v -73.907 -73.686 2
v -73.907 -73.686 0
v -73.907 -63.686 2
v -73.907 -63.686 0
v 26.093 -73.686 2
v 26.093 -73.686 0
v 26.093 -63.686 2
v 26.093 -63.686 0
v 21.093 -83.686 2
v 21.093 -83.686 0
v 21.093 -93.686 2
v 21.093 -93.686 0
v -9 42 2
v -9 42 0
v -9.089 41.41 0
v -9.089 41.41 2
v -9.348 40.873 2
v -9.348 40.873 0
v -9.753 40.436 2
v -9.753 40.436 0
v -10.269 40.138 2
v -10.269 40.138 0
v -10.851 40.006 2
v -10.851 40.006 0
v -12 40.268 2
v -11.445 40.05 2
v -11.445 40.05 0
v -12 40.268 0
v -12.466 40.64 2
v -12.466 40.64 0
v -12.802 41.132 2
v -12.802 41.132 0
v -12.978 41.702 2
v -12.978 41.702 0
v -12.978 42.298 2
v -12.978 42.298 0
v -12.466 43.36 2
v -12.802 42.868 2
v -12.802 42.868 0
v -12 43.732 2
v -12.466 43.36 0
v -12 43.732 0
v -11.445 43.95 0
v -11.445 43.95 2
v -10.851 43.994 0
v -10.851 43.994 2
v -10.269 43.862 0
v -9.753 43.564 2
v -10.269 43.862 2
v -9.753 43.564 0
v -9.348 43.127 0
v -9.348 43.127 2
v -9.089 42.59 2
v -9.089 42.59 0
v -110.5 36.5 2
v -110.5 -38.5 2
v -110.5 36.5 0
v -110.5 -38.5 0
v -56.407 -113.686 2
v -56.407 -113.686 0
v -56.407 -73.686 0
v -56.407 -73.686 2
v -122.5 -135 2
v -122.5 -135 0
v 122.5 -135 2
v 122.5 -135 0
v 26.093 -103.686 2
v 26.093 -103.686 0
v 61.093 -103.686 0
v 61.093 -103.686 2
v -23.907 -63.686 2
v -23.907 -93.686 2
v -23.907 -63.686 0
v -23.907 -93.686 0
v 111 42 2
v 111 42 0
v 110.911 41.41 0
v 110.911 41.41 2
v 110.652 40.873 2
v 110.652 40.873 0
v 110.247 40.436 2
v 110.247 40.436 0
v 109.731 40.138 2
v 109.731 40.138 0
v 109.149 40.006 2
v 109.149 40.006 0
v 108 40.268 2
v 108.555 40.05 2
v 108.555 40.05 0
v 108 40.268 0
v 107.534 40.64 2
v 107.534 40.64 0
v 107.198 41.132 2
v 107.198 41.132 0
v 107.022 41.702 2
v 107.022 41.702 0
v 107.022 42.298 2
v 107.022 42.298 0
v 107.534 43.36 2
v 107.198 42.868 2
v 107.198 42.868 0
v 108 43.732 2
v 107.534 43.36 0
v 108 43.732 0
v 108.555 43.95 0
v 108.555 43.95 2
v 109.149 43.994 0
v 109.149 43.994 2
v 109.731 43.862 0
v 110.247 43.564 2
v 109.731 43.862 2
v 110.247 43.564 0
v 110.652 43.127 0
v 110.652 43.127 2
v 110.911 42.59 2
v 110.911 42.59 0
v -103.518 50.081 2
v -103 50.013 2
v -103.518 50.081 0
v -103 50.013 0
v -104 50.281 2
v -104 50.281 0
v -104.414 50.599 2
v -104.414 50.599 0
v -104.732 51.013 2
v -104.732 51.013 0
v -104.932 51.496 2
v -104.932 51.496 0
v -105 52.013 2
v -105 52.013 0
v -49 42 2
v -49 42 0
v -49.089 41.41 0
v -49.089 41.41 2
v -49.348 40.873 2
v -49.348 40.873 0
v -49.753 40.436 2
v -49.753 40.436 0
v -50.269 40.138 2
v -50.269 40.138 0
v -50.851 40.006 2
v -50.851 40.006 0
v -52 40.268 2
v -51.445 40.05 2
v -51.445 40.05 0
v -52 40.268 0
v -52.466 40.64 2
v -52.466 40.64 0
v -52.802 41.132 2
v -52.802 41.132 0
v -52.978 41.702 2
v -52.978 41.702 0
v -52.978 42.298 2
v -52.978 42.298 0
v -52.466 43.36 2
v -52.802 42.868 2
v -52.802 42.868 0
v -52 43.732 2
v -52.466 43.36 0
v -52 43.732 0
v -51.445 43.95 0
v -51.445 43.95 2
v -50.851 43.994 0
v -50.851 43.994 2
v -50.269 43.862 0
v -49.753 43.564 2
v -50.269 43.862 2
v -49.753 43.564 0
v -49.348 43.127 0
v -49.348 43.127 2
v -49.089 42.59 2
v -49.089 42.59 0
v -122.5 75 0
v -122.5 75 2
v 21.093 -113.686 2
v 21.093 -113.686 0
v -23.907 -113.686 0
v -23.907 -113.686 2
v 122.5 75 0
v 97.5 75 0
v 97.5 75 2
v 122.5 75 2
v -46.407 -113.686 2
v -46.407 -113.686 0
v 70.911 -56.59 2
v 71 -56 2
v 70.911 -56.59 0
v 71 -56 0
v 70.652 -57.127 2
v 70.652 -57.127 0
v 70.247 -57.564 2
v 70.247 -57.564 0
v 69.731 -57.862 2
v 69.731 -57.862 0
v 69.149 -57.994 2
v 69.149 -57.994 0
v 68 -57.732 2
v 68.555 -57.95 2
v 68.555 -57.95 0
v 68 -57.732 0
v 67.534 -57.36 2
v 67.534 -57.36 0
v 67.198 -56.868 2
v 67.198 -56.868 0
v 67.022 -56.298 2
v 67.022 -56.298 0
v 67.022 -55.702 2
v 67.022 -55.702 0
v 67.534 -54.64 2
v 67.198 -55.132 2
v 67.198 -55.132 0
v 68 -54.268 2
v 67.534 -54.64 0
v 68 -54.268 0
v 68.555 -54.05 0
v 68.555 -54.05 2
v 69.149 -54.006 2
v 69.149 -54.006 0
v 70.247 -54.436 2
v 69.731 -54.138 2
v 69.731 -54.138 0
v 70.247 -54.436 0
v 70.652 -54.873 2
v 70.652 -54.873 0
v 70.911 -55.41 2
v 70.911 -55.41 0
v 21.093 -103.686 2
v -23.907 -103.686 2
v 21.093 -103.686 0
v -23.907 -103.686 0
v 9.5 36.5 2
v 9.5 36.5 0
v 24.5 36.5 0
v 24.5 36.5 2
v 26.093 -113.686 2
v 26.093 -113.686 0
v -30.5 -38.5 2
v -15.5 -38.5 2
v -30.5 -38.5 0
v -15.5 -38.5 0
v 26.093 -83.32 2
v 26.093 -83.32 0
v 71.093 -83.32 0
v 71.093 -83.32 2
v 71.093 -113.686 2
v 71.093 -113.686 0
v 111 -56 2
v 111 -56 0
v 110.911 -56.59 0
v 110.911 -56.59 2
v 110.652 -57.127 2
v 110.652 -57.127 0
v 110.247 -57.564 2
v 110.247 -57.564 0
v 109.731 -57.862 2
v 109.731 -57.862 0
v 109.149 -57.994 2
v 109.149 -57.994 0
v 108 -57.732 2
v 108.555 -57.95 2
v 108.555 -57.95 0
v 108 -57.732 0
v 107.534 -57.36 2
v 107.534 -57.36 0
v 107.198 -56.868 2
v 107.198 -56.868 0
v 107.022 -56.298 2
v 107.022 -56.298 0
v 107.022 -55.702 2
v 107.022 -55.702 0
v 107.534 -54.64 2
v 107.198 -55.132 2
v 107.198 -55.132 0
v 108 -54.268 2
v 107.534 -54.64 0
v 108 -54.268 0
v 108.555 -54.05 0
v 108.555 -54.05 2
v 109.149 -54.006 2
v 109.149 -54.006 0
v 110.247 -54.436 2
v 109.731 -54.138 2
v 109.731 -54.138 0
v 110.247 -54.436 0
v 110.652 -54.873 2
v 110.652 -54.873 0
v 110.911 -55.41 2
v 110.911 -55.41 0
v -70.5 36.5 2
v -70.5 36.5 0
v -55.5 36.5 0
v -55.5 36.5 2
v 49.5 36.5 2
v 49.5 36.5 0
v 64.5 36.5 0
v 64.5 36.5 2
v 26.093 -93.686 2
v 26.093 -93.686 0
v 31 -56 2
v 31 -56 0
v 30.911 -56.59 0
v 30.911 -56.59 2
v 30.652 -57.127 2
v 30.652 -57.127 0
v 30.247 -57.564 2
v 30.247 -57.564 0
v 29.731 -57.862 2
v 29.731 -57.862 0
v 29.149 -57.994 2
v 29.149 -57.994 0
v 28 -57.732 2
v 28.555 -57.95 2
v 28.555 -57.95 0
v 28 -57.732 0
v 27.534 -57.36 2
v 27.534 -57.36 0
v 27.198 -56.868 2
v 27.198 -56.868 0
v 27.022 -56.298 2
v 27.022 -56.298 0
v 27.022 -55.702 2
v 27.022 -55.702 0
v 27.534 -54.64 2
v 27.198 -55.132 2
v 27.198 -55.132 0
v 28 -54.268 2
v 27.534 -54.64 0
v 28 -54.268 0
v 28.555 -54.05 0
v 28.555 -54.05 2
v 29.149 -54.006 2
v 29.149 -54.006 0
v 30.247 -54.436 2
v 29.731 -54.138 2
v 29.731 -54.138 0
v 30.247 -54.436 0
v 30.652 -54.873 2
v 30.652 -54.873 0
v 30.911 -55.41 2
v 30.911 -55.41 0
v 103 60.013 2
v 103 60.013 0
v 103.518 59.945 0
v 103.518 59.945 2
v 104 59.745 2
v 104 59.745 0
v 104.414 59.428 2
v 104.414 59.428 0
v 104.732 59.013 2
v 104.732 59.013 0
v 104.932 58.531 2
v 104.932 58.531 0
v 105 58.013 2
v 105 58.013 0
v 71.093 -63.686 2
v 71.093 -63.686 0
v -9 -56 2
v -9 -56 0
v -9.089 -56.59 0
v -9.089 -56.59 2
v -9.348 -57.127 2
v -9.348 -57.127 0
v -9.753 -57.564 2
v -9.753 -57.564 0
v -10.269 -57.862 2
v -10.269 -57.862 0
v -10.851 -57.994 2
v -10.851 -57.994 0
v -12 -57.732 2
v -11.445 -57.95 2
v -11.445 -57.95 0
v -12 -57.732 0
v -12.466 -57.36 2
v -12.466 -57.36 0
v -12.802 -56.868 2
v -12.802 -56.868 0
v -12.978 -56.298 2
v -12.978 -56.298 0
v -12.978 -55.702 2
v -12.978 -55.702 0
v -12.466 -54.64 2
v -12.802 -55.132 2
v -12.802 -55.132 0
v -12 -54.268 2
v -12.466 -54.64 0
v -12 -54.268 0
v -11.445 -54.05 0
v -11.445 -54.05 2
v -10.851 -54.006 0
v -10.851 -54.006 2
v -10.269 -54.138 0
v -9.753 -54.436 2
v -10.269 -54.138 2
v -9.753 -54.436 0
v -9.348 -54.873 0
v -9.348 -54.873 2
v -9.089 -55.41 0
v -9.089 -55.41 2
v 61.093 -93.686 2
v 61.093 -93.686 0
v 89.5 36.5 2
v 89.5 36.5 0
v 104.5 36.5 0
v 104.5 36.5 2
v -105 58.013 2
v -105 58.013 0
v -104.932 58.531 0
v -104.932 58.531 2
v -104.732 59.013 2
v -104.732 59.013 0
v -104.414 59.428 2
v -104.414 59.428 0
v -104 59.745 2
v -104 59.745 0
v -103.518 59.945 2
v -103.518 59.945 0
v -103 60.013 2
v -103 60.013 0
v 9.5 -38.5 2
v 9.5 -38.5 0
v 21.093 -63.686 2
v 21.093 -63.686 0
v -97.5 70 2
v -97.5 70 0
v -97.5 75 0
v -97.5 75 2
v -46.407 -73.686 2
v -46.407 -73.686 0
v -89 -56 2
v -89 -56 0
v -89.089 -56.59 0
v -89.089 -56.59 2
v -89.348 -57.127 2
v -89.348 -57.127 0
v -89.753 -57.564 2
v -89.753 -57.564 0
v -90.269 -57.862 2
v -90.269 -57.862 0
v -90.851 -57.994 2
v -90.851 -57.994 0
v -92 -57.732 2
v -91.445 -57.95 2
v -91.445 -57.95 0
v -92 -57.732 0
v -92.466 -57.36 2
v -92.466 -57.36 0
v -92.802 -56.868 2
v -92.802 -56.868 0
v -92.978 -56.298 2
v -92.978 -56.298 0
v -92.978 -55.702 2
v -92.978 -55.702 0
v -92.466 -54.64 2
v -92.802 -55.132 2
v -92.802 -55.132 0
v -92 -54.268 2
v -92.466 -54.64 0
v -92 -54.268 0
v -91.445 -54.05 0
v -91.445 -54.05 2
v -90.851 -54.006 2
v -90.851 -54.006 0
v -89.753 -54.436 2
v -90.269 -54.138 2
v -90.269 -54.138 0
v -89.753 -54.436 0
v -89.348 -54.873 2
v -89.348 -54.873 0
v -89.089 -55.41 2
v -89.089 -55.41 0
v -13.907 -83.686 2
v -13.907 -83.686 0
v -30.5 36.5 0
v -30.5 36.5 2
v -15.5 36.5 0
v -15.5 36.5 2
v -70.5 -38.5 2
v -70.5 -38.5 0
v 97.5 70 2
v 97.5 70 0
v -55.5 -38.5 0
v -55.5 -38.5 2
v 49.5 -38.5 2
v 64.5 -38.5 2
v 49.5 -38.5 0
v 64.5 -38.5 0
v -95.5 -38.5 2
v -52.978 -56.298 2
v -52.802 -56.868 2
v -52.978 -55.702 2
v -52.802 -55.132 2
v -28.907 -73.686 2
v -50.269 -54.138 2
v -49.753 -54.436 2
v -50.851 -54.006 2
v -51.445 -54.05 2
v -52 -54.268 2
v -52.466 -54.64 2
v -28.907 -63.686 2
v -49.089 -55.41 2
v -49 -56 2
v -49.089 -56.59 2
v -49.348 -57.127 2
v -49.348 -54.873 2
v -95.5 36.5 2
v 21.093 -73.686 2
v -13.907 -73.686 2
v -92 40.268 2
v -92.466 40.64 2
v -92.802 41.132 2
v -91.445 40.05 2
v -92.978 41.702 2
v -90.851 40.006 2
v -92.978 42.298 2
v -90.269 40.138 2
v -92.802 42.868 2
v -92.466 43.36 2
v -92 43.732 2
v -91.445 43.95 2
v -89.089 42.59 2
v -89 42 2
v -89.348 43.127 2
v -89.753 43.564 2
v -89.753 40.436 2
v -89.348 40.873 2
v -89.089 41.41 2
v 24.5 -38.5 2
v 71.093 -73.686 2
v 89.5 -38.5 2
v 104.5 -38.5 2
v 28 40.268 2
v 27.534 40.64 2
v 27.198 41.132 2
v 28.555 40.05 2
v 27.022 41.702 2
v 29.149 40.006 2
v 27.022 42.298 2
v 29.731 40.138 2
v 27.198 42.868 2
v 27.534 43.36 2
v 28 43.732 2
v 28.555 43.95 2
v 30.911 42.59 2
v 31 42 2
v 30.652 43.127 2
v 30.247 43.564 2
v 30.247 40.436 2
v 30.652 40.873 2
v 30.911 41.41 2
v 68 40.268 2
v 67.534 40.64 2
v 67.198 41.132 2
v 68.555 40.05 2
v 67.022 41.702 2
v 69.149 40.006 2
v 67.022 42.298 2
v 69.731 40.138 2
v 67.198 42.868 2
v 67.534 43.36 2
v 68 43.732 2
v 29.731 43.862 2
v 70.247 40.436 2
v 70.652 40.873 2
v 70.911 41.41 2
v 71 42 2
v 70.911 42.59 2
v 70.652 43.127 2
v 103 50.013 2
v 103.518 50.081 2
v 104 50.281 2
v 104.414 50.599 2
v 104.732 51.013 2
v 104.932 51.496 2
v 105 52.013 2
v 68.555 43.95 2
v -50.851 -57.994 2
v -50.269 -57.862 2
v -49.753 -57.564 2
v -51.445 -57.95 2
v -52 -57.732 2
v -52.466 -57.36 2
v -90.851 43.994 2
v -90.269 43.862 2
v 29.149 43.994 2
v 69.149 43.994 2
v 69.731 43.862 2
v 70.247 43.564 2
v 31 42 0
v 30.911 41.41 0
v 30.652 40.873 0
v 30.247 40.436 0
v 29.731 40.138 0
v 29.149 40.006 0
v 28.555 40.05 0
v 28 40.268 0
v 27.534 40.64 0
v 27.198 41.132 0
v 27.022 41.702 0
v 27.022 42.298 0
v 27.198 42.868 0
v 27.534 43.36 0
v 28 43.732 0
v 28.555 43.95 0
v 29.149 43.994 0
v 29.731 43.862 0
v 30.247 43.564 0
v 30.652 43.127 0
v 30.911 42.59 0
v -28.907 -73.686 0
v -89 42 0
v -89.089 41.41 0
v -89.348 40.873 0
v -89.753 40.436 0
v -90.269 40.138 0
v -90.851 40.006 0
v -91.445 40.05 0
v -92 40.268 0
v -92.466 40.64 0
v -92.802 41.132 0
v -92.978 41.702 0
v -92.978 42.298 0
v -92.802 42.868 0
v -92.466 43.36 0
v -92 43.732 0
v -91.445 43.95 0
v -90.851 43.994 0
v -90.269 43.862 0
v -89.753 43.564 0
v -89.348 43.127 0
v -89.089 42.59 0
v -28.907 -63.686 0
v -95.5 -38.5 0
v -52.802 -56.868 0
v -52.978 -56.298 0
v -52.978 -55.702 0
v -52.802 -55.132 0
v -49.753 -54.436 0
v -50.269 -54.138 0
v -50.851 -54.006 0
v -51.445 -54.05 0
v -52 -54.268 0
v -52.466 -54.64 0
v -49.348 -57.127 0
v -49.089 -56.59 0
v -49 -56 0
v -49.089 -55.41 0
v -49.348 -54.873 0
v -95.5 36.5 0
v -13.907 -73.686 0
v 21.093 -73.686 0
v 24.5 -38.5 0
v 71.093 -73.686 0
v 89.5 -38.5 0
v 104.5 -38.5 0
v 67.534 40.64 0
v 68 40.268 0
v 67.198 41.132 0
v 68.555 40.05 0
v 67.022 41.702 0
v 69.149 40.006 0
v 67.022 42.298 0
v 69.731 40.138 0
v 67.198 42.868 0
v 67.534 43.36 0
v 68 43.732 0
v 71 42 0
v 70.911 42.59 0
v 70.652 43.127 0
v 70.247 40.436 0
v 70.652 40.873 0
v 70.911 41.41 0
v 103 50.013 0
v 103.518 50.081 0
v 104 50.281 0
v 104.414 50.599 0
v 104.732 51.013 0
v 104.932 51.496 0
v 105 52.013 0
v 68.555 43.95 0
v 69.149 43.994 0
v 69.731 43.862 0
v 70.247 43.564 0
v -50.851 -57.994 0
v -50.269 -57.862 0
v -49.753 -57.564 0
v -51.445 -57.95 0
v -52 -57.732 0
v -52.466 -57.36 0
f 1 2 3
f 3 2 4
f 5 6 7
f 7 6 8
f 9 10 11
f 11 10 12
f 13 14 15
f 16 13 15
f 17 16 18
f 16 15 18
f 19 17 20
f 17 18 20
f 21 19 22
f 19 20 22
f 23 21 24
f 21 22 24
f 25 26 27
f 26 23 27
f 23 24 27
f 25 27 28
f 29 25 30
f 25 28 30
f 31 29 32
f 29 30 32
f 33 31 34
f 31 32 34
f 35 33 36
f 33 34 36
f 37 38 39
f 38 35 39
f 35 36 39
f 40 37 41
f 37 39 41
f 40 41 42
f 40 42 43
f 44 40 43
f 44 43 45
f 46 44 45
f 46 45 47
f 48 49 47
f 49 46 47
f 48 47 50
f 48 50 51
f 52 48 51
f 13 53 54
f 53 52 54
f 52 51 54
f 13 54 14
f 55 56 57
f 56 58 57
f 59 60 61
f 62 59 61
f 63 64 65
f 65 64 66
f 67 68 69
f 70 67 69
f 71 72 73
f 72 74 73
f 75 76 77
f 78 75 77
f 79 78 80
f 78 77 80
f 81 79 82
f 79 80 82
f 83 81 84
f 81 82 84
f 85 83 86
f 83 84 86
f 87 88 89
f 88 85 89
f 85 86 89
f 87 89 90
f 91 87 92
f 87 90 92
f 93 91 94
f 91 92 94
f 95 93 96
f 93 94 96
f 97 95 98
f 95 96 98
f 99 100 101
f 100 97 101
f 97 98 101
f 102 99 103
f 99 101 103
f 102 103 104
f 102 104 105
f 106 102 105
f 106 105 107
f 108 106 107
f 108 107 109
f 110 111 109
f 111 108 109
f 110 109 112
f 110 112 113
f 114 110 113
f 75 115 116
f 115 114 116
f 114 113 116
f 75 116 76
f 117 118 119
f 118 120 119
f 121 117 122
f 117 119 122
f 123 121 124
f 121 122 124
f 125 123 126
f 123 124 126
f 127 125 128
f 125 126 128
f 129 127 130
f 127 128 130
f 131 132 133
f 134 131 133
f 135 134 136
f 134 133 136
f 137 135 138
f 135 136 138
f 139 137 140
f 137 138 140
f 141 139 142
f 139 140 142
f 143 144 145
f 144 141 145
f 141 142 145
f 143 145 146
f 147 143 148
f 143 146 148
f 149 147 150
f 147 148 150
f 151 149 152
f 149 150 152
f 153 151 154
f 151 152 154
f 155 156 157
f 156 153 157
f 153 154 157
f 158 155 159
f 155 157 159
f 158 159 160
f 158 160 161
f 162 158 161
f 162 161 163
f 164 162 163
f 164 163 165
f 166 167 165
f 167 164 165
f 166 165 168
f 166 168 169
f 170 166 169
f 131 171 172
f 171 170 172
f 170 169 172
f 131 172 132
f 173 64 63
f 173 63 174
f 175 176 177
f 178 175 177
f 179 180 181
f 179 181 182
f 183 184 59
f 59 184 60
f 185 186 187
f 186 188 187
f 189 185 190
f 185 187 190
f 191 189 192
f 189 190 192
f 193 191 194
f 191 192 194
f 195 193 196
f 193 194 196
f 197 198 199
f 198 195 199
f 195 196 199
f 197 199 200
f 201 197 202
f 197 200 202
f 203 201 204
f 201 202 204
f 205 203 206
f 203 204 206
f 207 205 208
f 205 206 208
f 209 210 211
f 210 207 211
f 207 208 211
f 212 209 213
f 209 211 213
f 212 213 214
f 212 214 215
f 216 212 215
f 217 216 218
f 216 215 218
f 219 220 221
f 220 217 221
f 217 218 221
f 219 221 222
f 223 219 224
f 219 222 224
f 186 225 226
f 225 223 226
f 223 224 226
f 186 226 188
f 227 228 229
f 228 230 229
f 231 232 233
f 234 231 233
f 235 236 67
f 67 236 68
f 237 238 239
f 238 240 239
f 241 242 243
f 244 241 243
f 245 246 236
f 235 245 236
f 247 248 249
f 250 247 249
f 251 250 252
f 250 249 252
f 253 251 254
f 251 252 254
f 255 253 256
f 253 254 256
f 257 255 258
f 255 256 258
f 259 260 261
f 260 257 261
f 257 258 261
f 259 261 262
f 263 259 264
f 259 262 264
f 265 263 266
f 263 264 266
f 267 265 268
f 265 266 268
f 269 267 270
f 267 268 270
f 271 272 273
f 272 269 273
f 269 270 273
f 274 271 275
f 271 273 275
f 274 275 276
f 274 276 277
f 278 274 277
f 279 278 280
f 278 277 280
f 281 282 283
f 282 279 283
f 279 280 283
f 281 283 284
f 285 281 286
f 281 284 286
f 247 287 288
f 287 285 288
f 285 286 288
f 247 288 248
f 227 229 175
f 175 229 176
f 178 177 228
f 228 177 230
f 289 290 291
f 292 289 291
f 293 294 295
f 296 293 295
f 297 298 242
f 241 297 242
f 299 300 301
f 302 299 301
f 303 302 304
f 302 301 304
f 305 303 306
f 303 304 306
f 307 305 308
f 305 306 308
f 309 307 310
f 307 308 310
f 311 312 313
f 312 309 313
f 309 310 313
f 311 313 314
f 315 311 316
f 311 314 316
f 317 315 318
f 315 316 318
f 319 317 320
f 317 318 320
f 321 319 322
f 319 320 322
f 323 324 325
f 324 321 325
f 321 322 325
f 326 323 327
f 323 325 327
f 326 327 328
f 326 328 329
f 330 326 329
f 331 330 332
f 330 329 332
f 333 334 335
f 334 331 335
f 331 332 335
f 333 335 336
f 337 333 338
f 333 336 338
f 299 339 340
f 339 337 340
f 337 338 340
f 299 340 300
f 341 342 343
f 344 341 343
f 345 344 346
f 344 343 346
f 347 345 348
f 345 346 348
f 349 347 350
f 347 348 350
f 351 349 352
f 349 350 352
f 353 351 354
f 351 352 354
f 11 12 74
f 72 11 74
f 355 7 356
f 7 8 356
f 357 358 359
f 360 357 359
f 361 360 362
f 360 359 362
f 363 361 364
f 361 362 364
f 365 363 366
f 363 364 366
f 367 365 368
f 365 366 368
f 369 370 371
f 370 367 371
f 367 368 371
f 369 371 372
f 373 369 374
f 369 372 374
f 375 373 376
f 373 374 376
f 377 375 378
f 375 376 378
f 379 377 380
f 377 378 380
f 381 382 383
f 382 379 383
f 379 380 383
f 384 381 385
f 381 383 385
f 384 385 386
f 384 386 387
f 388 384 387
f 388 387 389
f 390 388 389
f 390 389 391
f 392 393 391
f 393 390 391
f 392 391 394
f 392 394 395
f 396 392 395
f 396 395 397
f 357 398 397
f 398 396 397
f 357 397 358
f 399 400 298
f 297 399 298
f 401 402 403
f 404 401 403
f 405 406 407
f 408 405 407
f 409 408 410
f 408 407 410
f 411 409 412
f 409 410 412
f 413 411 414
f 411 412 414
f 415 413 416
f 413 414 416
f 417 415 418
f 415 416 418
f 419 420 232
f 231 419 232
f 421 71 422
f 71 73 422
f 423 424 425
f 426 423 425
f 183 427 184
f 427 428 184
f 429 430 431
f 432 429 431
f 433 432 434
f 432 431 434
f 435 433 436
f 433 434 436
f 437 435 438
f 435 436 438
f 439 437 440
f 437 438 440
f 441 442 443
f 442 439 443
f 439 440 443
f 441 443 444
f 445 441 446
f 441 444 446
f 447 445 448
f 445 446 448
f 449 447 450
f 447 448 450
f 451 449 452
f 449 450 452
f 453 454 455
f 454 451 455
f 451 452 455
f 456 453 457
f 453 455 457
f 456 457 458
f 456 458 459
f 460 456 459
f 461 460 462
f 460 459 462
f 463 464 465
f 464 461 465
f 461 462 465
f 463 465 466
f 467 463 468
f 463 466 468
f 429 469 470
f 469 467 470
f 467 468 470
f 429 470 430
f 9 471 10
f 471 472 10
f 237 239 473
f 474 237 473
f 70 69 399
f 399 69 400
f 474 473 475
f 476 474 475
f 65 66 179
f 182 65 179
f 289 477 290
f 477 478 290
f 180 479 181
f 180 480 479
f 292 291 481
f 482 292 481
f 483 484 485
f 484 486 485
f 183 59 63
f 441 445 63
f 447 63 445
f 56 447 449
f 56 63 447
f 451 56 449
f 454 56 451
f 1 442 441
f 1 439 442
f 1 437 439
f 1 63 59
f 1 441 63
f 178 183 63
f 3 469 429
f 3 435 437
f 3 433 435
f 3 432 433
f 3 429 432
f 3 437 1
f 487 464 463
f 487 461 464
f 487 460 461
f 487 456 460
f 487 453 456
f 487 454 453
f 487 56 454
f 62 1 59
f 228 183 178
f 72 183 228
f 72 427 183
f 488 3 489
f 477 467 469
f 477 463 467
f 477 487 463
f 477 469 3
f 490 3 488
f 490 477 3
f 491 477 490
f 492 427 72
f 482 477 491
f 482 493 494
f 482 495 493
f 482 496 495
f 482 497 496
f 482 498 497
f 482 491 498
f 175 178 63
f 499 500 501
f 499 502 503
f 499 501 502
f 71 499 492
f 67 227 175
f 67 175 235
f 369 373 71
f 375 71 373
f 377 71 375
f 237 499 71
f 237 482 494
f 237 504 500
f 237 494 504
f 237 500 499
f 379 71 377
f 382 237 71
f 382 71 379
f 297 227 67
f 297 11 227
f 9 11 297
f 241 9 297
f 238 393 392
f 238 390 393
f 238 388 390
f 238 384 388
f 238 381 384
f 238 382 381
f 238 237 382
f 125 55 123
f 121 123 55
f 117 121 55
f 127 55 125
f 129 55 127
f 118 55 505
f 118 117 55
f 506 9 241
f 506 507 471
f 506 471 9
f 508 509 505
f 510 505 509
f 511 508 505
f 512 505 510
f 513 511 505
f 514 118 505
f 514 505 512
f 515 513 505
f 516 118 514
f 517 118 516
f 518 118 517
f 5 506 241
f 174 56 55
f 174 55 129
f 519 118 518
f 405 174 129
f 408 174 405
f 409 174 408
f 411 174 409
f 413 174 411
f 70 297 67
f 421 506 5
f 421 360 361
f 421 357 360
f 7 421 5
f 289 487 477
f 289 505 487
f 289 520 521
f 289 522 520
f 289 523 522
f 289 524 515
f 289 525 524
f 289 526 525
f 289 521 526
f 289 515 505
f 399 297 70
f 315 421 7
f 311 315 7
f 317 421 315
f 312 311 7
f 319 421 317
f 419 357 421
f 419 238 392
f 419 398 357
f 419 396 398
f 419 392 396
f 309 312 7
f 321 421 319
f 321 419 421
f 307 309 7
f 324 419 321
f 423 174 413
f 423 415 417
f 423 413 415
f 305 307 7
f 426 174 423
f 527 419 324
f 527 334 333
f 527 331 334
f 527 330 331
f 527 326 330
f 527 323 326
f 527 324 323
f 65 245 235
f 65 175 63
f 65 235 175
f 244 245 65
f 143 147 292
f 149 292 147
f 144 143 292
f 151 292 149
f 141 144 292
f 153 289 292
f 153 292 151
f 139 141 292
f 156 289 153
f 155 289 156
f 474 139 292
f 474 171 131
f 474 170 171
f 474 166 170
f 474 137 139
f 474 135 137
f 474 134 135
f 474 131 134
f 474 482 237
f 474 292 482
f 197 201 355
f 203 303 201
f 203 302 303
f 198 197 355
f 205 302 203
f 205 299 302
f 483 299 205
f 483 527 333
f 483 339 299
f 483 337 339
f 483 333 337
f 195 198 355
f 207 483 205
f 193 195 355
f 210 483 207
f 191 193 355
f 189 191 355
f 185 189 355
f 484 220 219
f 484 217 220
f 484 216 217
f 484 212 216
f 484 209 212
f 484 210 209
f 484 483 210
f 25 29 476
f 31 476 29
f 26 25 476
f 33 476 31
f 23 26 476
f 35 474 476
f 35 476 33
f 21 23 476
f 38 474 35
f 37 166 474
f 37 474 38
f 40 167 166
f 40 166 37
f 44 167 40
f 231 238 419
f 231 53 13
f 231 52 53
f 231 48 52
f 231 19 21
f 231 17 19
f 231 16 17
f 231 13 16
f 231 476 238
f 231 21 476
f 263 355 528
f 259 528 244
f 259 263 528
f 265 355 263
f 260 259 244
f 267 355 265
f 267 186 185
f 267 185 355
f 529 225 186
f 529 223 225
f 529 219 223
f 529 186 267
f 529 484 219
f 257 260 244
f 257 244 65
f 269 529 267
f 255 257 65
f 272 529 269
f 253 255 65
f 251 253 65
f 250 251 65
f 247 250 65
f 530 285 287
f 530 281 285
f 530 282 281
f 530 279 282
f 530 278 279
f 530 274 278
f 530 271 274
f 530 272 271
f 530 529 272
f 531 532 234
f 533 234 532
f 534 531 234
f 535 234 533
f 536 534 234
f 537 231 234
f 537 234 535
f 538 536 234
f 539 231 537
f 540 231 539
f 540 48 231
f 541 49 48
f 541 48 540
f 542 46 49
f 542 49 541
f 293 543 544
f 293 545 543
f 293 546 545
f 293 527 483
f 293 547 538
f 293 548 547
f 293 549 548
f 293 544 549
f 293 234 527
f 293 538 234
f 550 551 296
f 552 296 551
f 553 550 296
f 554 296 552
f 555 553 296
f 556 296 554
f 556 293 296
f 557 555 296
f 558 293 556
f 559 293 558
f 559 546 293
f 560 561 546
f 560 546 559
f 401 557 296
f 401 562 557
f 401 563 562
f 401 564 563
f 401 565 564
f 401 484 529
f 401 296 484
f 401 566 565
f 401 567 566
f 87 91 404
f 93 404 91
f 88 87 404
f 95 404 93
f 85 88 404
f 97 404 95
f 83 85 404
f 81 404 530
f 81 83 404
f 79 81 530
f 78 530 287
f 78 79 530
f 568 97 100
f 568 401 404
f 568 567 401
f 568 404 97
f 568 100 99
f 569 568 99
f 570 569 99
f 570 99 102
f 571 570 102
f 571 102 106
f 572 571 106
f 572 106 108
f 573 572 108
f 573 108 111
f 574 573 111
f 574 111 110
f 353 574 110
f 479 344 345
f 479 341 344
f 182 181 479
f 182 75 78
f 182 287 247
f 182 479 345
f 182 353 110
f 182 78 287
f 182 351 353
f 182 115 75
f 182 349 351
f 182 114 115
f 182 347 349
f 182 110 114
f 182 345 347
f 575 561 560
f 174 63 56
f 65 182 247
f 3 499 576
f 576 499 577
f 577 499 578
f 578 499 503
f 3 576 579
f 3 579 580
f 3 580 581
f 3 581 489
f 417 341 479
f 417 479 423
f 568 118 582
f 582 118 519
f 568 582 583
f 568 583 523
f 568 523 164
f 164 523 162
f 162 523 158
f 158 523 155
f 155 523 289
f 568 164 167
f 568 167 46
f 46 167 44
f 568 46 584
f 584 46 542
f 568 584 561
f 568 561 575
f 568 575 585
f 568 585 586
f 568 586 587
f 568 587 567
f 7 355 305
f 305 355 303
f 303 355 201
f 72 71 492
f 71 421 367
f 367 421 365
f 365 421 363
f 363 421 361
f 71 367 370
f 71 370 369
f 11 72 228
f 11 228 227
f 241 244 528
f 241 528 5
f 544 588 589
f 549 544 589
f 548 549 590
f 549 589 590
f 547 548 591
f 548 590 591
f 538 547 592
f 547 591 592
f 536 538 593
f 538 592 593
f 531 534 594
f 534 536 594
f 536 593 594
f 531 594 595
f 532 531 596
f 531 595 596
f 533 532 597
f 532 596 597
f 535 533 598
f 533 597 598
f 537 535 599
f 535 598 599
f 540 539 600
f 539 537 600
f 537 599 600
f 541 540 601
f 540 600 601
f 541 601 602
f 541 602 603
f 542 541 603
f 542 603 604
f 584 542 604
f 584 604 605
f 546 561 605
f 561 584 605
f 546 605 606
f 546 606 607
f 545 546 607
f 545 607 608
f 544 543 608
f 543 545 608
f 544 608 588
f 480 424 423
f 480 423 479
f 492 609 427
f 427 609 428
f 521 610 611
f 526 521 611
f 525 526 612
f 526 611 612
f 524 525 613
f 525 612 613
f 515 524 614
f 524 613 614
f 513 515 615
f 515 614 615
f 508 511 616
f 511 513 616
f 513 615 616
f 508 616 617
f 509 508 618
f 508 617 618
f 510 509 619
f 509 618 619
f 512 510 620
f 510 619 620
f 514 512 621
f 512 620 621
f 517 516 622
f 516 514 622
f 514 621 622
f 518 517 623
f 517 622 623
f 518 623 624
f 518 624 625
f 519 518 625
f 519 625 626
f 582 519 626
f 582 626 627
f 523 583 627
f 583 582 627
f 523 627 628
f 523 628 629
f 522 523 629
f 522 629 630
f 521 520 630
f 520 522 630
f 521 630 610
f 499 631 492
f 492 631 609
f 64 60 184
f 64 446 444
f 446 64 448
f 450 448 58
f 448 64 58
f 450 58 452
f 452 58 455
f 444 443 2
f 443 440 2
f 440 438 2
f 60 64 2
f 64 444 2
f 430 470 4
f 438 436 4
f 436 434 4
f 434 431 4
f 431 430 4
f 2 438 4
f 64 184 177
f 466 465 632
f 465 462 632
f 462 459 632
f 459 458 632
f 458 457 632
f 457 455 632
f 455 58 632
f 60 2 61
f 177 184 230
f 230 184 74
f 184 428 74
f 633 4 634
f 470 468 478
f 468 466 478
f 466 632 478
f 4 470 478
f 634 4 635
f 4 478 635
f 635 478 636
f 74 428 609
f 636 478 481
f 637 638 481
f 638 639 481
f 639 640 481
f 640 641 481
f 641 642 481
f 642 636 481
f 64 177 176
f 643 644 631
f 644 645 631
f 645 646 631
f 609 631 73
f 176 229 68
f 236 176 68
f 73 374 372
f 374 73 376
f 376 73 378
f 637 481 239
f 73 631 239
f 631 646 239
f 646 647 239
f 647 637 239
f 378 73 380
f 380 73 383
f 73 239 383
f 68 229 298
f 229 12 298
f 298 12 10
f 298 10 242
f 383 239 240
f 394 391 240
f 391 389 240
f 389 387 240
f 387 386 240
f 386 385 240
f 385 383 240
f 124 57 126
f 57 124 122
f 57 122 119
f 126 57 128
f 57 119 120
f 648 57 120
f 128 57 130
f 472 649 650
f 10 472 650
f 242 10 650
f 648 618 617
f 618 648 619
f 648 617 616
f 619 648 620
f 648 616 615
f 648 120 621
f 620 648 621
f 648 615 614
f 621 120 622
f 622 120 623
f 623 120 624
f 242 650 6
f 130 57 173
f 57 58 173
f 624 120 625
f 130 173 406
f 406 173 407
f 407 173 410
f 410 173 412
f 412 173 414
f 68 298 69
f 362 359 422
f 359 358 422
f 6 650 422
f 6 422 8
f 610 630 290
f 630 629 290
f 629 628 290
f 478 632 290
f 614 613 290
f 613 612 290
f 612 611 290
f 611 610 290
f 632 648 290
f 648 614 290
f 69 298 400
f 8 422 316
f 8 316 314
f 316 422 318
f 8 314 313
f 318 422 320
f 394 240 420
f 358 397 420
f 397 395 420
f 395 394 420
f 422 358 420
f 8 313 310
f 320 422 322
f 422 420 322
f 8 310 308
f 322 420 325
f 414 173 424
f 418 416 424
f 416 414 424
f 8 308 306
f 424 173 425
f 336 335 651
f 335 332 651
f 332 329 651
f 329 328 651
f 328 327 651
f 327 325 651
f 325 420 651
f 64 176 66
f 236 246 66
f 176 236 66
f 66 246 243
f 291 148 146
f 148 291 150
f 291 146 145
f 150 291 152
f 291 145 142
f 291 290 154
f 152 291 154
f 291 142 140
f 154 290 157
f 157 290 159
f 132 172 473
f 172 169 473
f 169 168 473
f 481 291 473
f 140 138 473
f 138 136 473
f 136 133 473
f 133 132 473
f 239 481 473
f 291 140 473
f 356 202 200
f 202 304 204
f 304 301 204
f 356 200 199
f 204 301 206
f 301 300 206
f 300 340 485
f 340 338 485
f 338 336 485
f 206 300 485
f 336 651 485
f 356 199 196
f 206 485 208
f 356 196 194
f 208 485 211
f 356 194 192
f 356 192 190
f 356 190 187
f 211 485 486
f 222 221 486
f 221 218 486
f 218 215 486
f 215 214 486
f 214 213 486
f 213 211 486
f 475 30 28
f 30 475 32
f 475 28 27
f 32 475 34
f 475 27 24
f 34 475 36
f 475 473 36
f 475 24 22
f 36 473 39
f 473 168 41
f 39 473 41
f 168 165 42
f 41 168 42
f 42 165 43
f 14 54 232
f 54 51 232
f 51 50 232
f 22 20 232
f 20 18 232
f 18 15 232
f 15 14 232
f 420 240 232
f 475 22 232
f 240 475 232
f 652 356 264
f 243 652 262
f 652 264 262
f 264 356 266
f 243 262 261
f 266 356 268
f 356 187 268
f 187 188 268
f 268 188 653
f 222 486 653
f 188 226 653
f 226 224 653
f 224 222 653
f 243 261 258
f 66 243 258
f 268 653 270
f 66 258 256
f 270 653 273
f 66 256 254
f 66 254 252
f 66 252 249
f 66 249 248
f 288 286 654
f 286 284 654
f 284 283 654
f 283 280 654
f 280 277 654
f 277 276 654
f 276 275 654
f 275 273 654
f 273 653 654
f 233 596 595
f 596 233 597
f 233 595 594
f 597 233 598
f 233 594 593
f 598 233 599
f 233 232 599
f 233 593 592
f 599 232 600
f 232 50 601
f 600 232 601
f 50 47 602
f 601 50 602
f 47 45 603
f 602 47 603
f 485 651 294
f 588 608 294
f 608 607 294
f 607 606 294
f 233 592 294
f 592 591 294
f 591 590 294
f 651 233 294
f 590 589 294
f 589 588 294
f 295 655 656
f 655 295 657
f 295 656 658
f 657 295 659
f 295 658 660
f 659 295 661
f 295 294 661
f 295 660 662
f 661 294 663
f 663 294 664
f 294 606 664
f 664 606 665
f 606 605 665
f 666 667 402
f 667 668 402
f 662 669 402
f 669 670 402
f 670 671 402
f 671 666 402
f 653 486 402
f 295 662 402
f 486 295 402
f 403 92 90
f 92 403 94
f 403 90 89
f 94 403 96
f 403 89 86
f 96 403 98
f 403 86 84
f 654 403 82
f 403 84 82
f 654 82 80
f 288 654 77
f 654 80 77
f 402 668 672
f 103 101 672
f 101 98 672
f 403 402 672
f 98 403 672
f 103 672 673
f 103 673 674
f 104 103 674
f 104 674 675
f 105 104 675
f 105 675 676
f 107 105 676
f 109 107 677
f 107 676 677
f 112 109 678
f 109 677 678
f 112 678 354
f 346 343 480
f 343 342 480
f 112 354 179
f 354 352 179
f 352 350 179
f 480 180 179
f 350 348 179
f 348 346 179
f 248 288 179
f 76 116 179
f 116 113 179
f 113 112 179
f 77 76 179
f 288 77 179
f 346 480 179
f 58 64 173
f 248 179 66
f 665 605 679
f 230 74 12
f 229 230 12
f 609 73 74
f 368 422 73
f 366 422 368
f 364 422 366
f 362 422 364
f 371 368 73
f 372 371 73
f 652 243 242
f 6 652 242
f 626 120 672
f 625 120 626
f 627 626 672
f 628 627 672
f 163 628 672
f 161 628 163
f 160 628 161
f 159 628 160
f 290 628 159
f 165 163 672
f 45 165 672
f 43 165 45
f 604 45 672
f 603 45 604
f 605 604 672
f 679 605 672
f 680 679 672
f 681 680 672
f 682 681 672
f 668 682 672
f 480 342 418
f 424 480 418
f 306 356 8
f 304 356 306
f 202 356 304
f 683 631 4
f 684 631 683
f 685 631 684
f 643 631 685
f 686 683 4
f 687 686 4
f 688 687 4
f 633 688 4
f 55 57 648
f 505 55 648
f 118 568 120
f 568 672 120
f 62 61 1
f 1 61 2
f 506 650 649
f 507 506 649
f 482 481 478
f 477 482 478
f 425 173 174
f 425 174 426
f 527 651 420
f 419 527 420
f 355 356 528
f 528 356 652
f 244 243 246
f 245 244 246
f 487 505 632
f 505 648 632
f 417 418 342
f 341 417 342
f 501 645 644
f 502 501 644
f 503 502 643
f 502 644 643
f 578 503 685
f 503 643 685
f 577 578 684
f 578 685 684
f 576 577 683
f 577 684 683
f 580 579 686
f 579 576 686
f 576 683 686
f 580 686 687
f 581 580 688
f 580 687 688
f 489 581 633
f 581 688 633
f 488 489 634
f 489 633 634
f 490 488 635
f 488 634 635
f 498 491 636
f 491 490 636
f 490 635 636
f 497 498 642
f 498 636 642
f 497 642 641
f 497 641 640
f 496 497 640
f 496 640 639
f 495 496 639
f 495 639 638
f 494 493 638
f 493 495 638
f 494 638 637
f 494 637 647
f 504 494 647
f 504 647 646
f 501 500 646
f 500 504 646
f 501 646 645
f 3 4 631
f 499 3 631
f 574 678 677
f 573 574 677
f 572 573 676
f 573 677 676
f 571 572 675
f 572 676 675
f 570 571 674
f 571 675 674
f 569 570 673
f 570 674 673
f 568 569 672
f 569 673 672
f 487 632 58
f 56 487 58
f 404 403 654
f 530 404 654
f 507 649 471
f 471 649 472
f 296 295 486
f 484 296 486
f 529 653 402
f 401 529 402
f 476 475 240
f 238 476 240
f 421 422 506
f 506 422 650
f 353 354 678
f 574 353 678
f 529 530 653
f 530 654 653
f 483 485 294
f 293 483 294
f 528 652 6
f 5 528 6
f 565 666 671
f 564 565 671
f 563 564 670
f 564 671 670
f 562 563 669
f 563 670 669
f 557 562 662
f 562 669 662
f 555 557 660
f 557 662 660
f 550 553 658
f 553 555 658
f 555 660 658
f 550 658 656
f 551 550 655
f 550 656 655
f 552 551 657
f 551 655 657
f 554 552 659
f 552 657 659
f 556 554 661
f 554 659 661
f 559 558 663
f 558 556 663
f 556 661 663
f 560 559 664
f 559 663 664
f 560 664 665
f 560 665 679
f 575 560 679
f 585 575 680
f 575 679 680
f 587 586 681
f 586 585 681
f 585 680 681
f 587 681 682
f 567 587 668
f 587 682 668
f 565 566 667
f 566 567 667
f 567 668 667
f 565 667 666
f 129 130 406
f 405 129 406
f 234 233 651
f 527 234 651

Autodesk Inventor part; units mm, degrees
ref_plane "YZ Plane" through (0, 0, 0) normal (1, 0, 0) x (0, 1, 0)
ref_plane "XZ Plane" through (0, 0, 0) normal (0, 1, 0) x (-1, 0, 0)
ref_plane "XY Plane" through (0, 0, 0) normal (0, 0, 1) x (1, 0, 0)
ref_plane "Work Plane1" through (0, 0, 0) normal (0, 0, 1) x (1, 0, 0)
sketch "Sketch1" plane through (0, 0, 0) normal (0, 0, 1) x (1, 0, 0)
  line L0 (21.0929, -113.6856) -> (-23.9071, -113.6856)
  line L1 (-23.9071, -113.6856) -> (-23.9071, -103.6856)
  line L2 (-23.9071, -103.6856) -> (21.0929, -103.6856)
  line L3 (21.0929, -103.6856) -> (21.0929, -113.6856)
  line L4 (26.0929, -103.6856) -> (61.0929, -103.6856)
  line L5 (61.0929, -103.6856) -> (61.0929, -93.6856)
  line L6 (61.0929, -93.6856) -> (26.0929, -93.6856)
  line L7 (26.0929, -93.6856) -> (26.0929, -83.3195)
  line L8 (26.0929, -83.3195) -> (71.0929, -83.3195)
  line L9 (71.0929, -83.3195) -> (71.0929, -113.6856)
  line L10 (71.0929, -113.6856) -> (26.0929, -113.6856)
  line L11 (26.0929, -113.6856) -> (26.0929, -103.6856)
  line L12 (-13.9071, -83.6856) -> (21.0929, -83.6856)
  line L13 (21.0929, -83.6856) -> (21.0929, -93.6856)
  line L14 (21.0929, -93.6856) -> (-23.9071, -93.6856)
  line L15 (-23.9071, -93.6856) -> (-23.9071, -63.6856)
  line L16 (-23.9071, -63.6856) -> (21.0929, -63.6856)
  line L17 (21.0929, -63.6856) -> (21.0929, -73.6856)
  line L18 (21.0929, -73.6856) -> (-13.9071, -73.6856)
  line L19 (-13.9071, -73.6856) -> (-13.9071, -83.6856)
  line L20 (26.0929, -63.6856) -> (71.0929, -63.6856)
  line L21 (71.0929, -63.6856) -> (71.0929, -73.6856)
  line L22 (71.0929, -73.6856) -> (26.0929, -73.6856)
  line L23 (26.0929, -73.6856) -> (26.0929, -63.6856)
  line L24 (-28.9071, -63.6856) -> (-28.9071, -73.6856)
  line L25 (-28.9071, -73.6856) -> (-46.4071, -73.6856)
  line L26 (-46.4071, -73.6856) -> (-46.4071, -113.6856)
  line L27 (-46.4071, -113.6856) -> (-56.4071, -113.6856)
  line L28 (-56.4071, -113.6856) -> (-56.4071, -73.6856)
  line L29 (-56.4071, -73.6856) -> (-73.9071, -73.6856)
  line L30 (-73.9071, -73.6856) -> (-73.9071, -63.6856)
  line L31 (-73.9071, -63.6856) -> (-28.9071, -63.6856)
  line L32 (-103, 60.0133) -> (103, 60.0133)
  arc A0 (105, 58.0133) -> (103, 60.0133) centre (103, 58.0133) ccw
  line L33 (105, 58.0133) -> (105, 52.0133)
  arc A1 (103, 50.0133) -> (105, 52.0133) centre (103, 52.0133) ccw
  line L34 (103, 50.0133) -> (-103, 50.0133)
  arc A2 (-105, 52.0133) -> (-103, 50.0133) centre (-103, 52.0133) ccw
  line L35 (-105, 52.0133) -> (-105, 58.0133)
  arc A3 (-103, 60.0133) -> (-105, 58.0133) centre (-103, 58.0133) ccw
  line L36 (24.5, -38.5) -> (9.5, -38.5)
  line L37 (9.5, -38.5) -> (9.5, 36.5)
  line L38 (9.5, 36.5) -> (24.5, 36.5)
  line L39 (24.5, 36.5) -> (24.5, -38.5)
  line L40 (-110.5, 36.5) -> (-95.5, 36.5)
  line L41 (-95.5, 36.5) -> (-95.5, -38.5)
  line L42 (-95.5, -38.5) -> (-110.5, -38.5)
  line L43 (-110.5, -38.5) -> (-110.5, 36.5)
  line L44 (49.5, -38.5) -> (49.5, 36.5)
  line L45 (49.5, 36.5) -> (64.5, 36.5)
  line L46 (64.5, 36.5) -> (64.5, -38.5)
  line L47 (64.5, -38.5) -> (49.5, -38.5)
  line L48 (-15.5, -38.5) -> (-30.5, -38.5)
  line L49 (-30.5, -38.5) -> (-30.5, 36.5)
  line L50 (-30.5, 36.5) -> (-15.5, 36.5)
  line L51 (-15.5, 36.5) -> (-15.5, -38.5)
  line L52 (-55.5, 36.5) -> (-55.5, -38.5)
  line L53 (-55.5, -38.5) -> (-70.5, -38.5)
  line L54 (-70.5, -38.5) -> (-70.5, 36.5)
  line L55 (-70.5, 36.5) -> (-55.5, 36.5)
  line L56 (104.5, 36.5) -> (104.5, -38.5)
  line L57 (104.5, -38.5) -> (89.5, -38.5)
  line L58 (89.5, -38.5) -> (89.5, 36.5)
  line L59 (89.5, 36.5) -> (104.5, 36.5)
  circle A4 centre (29, 42) radius 2
  circle A5 centre (109, -56) radius 2
  circle A6 centre (-51, -56) radius 2
  circle A7 centre (-11, -56) radius 2
  circle A8 centre (-91, 42) radius 2
  circle A9 centre (69, 42) radius 2
  circle A10 centre (-11, 42) radius 2
  circle A11 centre (69, -56) radius 2
  circle A12 centre (-91, -56) radius 2
  circle A13 centre (29, -56) radius 2
  circle A14 centre (-51, 42) radius 2
  circle A15 centre (109, 42) radius 2
  line L60 (122.5, -135) -> (122.5, 75)
  line L61 (97.5, 75) -> (122.5, 75)
  line L62 (97.5, 70) -> (97.5, 75)
  line L63 (-97.5, 70) -> (97.5, 70)
  line L64 (-97.5, 70) -> (-97.5, 75)
  line L65 (-122.5, 75) -> (-97.5, 75)
  line L66 (-122.5, -135) -> (-122.5, 75)
  line L67 (-122.5, -135) -> (122.5, -135)
  point P0 (0, 0)
extrude "Plate1" add sketch "Sketch1" along normal blind 2
equation "\"d0\" = Thickness"
equation "\"BendRadius\" = Thickness"
equation "\"BendReliefWidth\" = Thickness"
equation "\"BendReliefDepth\" = 0.5 * Thickness"
equation "\"CornerReliefSize\" = 4 * Thickness"
equation "\"MinimumRemnant\" = 2 * Thickness"
equation "\"TransitionRadius\" = BendRadius"
equation "\"JacobiRadiusSize\" = BendRadius"
equation "\"GapSize\" = Thickness"
equation "\"Thickness\" = 2"
